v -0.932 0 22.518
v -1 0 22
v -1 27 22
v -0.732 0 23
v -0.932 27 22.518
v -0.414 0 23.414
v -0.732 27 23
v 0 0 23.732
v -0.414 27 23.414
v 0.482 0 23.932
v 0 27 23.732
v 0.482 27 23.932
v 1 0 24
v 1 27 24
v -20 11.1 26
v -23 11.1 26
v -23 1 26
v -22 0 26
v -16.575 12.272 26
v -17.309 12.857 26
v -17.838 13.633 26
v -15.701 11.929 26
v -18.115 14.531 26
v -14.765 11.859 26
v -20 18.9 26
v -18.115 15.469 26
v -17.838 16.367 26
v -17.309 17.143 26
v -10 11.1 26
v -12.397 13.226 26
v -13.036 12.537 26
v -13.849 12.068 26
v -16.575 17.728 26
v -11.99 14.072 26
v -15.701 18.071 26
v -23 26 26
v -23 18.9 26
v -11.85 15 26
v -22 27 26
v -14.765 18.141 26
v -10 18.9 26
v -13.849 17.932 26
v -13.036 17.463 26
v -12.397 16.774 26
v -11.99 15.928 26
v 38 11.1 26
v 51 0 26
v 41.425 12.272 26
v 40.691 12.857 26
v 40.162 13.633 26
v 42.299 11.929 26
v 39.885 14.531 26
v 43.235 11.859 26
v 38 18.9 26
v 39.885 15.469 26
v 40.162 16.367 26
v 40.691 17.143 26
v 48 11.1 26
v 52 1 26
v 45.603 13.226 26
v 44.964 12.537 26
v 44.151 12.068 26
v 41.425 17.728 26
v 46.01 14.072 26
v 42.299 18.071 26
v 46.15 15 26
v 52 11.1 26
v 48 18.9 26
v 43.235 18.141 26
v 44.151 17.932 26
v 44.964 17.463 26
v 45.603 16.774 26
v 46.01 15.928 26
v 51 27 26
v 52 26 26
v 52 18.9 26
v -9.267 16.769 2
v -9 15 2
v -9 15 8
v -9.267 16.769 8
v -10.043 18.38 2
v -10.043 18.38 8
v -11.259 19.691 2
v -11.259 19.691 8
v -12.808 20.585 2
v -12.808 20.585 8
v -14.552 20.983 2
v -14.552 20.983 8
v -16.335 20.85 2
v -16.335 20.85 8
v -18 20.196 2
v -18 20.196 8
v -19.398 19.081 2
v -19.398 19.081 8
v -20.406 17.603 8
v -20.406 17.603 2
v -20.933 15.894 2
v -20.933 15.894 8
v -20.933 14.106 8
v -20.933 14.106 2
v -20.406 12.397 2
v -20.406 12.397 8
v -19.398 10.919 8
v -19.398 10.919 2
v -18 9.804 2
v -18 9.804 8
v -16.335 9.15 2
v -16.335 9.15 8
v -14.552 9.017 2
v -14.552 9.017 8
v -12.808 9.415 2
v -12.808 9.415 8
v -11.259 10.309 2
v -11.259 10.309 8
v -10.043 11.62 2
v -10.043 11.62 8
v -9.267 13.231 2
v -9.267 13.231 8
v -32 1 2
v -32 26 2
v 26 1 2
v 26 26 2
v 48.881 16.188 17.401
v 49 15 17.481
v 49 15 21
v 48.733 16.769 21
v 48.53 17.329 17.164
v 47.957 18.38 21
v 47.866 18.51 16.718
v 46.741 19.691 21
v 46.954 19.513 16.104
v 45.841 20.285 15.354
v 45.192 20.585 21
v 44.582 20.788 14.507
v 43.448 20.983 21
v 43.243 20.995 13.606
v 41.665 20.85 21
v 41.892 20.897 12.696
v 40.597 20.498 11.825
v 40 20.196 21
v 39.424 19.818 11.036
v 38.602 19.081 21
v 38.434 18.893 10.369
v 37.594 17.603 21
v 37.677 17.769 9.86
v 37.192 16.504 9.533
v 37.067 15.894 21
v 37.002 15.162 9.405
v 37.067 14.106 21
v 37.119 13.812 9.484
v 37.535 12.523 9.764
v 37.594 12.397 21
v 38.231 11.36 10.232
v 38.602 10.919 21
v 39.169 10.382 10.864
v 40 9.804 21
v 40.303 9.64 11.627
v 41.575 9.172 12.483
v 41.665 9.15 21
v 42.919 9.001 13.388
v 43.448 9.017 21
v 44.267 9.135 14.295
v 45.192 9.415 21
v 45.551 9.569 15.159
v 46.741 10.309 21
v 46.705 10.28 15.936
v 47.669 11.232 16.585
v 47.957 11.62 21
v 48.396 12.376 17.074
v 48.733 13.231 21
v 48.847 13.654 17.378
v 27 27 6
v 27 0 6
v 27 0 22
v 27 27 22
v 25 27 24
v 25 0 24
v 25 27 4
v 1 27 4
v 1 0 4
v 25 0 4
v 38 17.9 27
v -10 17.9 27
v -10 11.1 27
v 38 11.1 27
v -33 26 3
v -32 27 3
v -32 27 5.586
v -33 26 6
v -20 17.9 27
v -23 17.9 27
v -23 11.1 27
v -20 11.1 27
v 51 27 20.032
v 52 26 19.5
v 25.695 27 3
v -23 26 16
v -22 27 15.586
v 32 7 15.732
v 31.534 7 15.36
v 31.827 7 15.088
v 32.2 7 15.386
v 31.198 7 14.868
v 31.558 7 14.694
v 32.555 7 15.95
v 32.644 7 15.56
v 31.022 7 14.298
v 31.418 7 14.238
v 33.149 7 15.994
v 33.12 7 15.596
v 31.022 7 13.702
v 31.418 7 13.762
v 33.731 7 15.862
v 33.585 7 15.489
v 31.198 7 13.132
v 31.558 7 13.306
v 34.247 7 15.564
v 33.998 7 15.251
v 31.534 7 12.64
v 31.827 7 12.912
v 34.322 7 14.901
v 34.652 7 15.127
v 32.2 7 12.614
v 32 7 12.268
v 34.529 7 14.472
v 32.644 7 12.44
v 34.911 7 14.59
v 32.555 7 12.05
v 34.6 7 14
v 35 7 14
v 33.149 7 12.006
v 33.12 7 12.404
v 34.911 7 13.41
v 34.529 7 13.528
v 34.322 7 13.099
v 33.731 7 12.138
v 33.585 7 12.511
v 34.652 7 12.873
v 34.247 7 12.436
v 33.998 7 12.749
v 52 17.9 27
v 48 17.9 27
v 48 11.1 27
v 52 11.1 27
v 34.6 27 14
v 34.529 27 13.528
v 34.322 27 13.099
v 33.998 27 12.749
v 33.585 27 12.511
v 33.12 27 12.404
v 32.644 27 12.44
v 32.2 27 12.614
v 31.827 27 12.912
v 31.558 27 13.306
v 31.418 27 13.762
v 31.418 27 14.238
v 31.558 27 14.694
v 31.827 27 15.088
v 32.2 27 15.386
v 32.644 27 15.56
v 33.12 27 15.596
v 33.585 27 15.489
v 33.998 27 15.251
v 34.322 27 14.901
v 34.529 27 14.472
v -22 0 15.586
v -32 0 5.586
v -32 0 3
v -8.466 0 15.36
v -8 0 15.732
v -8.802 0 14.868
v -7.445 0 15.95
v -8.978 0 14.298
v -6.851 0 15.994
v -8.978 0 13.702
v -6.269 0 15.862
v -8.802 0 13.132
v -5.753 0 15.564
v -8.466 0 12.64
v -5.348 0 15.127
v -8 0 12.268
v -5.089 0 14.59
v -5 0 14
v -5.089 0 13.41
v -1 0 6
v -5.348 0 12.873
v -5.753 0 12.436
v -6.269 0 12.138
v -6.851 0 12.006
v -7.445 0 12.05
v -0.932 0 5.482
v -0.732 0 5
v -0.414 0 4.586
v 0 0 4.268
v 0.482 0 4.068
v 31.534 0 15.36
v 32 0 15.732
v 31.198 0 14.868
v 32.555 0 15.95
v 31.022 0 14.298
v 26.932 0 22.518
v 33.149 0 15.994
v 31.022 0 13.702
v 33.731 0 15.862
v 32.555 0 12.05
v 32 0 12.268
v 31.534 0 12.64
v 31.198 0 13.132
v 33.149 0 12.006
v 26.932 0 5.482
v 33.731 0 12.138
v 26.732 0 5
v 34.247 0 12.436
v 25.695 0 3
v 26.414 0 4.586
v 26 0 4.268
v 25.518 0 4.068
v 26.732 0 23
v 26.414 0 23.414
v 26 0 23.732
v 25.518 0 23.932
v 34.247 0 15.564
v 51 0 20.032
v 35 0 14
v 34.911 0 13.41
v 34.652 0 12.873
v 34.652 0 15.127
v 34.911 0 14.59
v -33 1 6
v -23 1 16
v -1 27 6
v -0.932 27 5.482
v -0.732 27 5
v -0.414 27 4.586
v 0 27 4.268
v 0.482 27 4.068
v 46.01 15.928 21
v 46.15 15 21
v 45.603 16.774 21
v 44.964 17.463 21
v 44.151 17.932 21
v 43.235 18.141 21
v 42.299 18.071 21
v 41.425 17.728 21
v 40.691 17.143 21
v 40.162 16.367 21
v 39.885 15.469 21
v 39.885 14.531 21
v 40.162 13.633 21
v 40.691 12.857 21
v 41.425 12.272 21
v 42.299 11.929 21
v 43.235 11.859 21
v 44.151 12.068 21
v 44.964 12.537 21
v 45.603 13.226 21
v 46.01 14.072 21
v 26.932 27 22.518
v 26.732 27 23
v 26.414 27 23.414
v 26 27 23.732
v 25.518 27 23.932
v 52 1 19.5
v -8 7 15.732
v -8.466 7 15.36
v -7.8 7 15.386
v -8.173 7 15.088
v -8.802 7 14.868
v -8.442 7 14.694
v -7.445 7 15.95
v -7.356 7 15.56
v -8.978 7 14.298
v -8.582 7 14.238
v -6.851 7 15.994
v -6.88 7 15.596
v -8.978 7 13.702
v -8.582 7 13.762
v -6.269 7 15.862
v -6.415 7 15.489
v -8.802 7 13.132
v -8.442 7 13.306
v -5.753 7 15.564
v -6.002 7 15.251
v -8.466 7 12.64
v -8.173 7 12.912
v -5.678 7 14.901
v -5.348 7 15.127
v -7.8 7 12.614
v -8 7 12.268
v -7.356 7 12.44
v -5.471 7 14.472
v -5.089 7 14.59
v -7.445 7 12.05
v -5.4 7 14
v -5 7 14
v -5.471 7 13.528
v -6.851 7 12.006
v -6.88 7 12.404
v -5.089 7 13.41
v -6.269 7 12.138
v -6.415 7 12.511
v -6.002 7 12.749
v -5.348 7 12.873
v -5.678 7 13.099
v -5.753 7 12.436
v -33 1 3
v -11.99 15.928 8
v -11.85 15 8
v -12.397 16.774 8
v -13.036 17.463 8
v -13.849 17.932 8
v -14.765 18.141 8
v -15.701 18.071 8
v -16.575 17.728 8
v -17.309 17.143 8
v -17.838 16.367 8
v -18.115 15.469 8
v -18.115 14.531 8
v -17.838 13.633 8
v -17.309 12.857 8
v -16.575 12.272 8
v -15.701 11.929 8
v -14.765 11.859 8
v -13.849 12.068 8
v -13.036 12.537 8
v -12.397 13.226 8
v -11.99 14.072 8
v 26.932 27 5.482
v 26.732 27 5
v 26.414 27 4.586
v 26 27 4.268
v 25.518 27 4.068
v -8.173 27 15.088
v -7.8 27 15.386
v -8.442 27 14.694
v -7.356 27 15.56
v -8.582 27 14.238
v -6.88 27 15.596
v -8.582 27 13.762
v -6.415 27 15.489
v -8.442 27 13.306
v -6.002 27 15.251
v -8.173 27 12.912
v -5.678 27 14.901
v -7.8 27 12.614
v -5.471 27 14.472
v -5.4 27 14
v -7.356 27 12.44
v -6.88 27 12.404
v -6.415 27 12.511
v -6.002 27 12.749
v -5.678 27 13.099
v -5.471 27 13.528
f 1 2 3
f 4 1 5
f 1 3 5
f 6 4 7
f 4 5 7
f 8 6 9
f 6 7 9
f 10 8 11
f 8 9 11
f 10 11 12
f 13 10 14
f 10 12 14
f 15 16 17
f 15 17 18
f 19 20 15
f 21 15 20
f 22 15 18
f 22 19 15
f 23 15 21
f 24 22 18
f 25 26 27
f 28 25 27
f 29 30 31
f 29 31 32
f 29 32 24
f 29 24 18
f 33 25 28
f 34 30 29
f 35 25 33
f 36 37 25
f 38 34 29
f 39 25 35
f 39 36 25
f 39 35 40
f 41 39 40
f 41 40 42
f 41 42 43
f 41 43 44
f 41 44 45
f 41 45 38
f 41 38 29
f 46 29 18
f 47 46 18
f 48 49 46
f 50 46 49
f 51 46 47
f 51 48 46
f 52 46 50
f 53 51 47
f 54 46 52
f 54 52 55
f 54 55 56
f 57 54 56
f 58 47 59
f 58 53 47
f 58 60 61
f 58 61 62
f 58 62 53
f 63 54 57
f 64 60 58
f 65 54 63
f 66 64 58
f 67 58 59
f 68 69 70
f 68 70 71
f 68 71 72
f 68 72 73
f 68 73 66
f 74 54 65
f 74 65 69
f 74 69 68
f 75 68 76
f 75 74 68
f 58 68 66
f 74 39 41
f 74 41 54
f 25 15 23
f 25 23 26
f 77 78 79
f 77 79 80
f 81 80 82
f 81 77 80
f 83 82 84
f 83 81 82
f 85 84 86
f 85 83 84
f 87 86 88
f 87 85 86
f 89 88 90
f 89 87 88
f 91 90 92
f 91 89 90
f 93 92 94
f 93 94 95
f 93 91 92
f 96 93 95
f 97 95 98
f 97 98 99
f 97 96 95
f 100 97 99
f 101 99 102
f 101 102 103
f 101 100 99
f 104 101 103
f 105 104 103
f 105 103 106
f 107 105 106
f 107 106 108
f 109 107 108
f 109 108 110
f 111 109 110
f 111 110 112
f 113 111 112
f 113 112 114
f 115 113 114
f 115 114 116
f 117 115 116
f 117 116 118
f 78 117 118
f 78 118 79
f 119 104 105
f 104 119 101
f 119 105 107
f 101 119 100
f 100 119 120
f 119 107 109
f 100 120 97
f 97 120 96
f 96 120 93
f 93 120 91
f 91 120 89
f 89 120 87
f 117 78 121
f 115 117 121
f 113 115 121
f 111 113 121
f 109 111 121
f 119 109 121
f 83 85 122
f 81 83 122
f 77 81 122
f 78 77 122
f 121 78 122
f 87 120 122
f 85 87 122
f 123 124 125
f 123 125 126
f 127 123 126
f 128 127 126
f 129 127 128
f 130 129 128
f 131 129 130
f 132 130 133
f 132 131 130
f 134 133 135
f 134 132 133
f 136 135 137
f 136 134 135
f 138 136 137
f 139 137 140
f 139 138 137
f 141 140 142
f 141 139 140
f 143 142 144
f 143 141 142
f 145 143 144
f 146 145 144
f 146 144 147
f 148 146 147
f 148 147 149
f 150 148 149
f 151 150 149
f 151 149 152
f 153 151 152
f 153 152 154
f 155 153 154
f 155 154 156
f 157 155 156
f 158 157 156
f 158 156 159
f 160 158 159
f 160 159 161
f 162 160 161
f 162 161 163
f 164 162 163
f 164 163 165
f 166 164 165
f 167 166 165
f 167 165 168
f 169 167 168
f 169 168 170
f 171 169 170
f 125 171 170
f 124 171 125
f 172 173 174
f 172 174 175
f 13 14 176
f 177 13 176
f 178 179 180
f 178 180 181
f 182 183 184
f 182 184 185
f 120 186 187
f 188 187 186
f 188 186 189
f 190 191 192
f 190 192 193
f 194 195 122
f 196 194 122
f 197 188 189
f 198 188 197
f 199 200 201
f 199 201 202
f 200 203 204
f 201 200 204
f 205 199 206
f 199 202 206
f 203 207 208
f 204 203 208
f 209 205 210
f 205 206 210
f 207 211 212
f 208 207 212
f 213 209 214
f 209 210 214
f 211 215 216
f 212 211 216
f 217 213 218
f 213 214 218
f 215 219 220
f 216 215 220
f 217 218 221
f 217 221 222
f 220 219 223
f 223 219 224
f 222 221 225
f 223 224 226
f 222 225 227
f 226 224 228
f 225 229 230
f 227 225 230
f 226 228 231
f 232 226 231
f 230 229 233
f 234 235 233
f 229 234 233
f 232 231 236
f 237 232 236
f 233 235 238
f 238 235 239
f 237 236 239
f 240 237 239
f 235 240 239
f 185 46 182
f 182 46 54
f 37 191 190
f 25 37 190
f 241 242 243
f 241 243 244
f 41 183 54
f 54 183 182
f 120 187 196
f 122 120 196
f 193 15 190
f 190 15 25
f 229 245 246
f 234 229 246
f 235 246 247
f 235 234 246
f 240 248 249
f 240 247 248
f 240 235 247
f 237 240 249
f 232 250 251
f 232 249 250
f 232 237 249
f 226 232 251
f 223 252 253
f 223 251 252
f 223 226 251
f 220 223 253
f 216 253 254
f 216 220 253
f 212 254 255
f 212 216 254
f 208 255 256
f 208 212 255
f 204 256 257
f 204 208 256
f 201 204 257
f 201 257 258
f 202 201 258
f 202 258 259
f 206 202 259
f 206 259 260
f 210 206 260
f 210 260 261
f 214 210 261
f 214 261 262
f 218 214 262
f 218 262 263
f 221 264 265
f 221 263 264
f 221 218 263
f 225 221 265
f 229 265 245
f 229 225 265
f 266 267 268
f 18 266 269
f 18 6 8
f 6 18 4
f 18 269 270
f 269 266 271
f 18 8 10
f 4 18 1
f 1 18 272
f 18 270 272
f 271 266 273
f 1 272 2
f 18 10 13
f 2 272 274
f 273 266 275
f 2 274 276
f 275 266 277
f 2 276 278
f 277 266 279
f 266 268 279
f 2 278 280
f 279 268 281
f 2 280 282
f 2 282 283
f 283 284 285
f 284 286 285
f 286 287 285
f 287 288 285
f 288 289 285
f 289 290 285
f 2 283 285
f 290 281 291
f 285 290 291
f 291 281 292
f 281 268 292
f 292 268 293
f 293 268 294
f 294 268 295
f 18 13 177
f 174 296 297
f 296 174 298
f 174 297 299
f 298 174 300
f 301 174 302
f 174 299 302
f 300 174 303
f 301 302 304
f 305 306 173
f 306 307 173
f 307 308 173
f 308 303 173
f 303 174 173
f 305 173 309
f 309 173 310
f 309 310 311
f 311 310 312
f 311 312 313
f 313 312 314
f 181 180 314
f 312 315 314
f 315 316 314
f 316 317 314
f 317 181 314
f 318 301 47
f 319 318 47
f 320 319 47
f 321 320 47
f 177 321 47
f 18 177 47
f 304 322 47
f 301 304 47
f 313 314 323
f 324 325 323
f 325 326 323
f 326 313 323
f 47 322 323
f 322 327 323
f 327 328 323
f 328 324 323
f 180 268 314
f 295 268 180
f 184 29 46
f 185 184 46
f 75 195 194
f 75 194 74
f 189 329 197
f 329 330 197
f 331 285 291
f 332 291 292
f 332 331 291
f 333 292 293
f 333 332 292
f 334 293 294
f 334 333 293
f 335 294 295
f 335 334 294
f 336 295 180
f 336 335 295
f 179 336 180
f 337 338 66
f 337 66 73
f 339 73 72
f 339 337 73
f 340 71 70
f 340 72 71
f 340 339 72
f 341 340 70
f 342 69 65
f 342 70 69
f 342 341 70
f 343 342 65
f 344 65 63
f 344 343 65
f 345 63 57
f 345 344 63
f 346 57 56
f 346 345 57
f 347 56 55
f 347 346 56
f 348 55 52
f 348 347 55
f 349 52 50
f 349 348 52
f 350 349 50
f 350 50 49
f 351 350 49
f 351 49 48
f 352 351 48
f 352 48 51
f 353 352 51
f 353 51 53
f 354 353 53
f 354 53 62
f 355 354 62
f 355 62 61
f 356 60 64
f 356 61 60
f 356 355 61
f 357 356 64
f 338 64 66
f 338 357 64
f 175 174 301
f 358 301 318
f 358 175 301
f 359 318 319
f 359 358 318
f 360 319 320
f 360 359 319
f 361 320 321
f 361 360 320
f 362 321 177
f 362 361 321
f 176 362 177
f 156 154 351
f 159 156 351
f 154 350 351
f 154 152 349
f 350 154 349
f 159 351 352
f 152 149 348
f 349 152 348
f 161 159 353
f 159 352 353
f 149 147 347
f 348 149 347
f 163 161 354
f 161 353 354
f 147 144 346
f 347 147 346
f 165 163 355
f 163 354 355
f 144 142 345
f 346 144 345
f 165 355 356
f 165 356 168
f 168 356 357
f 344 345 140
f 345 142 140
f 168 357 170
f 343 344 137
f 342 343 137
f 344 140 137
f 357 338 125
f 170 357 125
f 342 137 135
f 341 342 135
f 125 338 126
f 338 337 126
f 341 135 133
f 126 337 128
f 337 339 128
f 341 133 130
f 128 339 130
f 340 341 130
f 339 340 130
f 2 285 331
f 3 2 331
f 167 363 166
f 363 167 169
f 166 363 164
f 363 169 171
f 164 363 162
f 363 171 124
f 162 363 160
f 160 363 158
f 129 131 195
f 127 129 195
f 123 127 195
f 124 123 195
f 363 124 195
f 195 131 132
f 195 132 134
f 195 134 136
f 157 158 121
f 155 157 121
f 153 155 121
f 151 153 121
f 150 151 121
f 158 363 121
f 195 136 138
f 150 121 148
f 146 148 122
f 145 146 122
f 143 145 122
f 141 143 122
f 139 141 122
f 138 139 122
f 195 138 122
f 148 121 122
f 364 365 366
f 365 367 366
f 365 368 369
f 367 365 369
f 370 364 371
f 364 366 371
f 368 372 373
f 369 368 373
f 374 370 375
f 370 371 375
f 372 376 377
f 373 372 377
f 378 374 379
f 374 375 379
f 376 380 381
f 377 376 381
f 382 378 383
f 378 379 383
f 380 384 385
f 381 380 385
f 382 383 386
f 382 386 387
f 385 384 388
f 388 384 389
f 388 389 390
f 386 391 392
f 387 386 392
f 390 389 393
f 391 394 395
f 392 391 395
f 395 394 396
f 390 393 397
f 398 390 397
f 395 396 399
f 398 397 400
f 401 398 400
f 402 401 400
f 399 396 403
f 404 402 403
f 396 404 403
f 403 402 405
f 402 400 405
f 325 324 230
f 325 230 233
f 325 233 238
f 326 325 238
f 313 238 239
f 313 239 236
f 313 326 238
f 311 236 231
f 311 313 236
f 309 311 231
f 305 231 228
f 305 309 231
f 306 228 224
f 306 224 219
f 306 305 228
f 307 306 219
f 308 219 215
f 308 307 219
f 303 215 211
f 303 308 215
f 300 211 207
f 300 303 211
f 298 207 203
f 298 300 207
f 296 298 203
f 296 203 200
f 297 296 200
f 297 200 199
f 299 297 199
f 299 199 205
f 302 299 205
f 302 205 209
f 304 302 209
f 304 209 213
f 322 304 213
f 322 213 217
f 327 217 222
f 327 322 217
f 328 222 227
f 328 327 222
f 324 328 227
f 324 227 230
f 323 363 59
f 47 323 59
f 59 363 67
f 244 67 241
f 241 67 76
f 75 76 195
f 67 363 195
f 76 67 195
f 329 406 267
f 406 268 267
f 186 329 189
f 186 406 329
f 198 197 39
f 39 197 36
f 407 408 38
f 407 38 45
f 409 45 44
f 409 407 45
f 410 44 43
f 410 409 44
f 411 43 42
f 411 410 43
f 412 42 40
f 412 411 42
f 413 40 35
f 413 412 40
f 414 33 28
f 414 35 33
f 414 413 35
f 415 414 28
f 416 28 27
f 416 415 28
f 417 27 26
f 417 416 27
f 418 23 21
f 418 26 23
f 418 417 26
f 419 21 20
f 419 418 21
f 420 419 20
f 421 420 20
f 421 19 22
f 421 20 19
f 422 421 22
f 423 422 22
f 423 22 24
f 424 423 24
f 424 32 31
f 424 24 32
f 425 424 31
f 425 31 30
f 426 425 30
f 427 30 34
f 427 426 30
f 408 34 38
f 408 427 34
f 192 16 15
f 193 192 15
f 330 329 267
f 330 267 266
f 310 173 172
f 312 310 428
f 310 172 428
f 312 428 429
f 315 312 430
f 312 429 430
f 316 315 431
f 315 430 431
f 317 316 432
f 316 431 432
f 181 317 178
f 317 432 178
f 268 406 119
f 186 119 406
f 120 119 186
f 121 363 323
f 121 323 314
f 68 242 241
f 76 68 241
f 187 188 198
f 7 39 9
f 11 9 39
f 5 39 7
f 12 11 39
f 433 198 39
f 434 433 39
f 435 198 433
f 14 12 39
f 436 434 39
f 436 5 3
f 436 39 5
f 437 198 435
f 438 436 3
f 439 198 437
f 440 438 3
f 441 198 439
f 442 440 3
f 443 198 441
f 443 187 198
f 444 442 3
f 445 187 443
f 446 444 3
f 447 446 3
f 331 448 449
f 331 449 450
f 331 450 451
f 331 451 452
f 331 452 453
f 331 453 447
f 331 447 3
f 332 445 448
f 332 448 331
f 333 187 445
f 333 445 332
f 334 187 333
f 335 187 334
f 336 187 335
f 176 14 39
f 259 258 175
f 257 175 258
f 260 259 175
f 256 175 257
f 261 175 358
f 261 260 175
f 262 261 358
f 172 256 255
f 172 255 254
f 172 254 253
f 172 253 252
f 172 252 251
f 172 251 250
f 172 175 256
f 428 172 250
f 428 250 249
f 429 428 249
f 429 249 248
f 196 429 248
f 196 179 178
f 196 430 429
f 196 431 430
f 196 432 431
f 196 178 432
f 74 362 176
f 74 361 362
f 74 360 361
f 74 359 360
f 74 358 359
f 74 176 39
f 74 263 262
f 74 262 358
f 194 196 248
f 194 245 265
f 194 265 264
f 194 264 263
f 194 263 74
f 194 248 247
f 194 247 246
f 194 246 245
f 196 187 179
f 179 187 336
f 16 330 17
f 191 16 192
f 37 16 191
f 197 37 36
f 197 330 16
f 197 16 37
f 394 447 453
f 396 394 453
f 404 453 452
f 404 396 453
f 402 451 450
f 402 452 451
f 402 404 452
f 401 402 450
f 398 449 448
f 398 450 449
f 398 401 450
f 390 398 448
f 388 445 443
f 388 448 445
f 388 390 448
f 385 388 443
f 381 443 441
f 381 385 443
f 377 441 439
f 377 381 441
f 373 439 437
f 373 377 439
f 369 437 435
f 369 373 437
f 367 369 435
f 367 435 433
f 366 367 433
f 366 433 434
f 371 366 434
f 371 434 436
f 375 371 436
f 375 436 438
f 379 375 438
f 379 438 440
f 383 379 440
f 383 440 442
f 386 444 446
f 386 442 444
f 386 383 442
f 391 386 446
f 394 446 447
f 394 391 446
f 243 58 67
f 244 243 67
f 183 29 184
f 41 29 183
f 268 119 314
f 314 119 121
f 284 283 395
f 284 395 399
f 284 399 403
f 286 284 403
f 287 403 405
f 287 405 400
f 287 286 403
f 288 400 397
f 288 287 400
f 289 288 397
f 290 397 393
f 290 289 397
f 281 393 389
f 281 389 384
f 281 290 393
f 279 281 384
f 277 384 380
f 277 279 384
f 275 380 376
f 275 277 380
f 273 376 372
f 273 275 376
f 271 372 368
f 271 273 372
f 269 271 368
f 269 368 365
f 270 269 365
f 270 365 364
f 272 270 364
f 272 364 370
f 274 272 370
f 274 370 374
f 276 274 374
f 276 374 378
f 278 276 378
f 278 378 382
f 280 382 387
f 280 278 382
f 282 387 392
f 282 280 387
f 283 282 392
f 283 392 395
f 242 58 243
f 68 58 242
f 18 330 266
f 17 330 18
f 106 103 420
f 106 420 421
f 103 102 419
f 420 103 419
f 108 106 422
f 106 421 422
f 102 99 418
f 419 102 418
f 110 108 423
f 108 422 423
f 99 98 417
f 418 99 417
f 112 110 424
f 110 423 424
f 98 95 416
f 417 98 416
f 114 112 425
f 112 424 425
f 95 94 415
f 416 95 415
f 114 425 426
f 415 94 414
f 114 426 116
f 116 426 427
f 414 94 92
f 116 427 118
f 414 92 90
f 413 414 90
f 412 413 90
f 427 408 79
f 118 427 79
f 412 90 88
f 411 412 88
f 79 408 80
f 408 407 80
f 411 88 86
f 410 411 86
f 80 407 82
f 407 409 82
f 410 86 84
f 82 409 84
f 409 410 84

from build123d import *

# Parameters (mm, degrees)
BOX007_W          = 10
BOX007_H          = 10
BOX007_DEPTH      = 10
BOX008_W          = 10
BOX008_H          = 10
BOX008_DEPTH      = 10
CYLINDER003_R     = 1.6
CYLINDER003_DEPTH = 30
CYLINDER002_R     = 1.6
CYLINDER002_DEPTH = 30
CYLINDER001_R     = 2
CYLINDER001_DEPTH = 7
CYLINDER_R        = 2
CYLINDER_DEPTH    = 7
BOX_W             = 28
BOX_H             = 30
BOX_DEPTH         = 20
FILLET_R          = 2
CYLINDER005_R     = 3.15
CYLINDER005_DEPTH = 30
CYLINDER004_R     = 6
CYLINDER004_DEPTH = 8
CYLINDER007_R     = 6
CYLINDER007_DEPTH = 21
CYLINDER006_R     = 3.15
CYLINDER006_DEPTH = 30
BOX003_W          = 75
BOX003_H          = 27
BOX003_DEPTH      = 24
CHAMFER002_SIZE2  = 26
CHAMFER002_SIZE   = 17.5
BOX004_W          = 11
BOX004_H          = 27
BOX004_DEPTH      = 14
CHAMFER_SIZE      = 10
BOX005_W          = 75
BOX005_H          = 7.8
BOX005_DEPTH      = 2
CHAMFER003_SIZE   = 1
CHAMFER004_SIZE   = 1


with BuildPart() as cube007:
    # Box007 → Box007 (new body)
    with BuildSketch(Plane(origin=(-20, 10, 26), x_dir=(1, 0, 0), z_dir=(0, 0, 1))):
        with Locations((5, 5)):
            Rectangle(BOX007_W, BOX007_H)
    extrude(amount=BOX007_DEPTH)


with BuildPart() as fusion002011:
    # Box008 → Box008 (new body)
    with BuildSketch(Plane(origin=(38, 10, 26), x_dir=(1, 0, 0), z_dir=(0, 0, 1))):
        with Locations((5, 5)):
            Rectangle(BOX008_W, BOX008_H)
    extrude(amount=BOX008_DEPTH)

    # Fusion002011: union Cube007
    add(cube007.part)


with BuildPart() as cylinder003:
    # Cylinder003 → Cylinder003 (new body)
    with BuildSketch(Plane(origin=(-20, 0, 17), x_dir=(1, 0, 0), z_dir=(0, 1, 0))):
        Circle(CYLINDER003_R)
    extrude(amount=CYLINDER003_DEPTH)


with BuildPart() as cylinder002:
    # Cylinder002 → Cylinder002 (new body)
    with BuildSketch(Plane(origin=(20, 0, 17), x_dir=(1, 0, 0), z_dir=(0, 1, 0))):
        Circle(CYLINDER002_R)
    extrude(amount=CYLINDER002_DEPTH)


with BuildPart() as cylinder001:
    # Cylinder001 → Cylinder001 (new body)
    with BuildSketch(Plane(origin=(20, 0, 17), x_dir=(1, 0, 0), z_dir=(0, 1, 0))):
        Circle(CYLINDER001_R)
    extrude(amount=CYLINDER001_DEPTH)


with BuildPart() as cylinder:
    # Cylinder → Cylinder (new body)
    with BuildSketch(Plane(origin=(-20, 0, 17), x_dir=(1, 0, 0), z_dir=(0, 1, 0))):
        Circle(CYLINDER_R)
    extrude(amount=CYLINDER_DEPTH)


with BuildPart() as plug_slot:
    # Box → Box (new body)
    with BuildSketch(Plane(origin=(-14, 0, 7), x_dir=(1, 0, 0), z_dir=(0, 0, 1))):
        with Locations((14, 15)):
            Rectangle(BOX_W, BOX_H)
    extrude(amount=BOX_DEPTH)

    # Fillet
    fillet_edges = [plug_slot.edges().sort_by_distance(p)[0] for p in [
        (-14, 15, 27),
        (-14, 15, 7),
        (14, 15, 27),
        (14, 15, 7),
    ]]
    fillet(fillet_edges, radius=FILLET_R)

    # Fusion: union Cylinder003, Cylinder002, Cylinder001, Cylinder
    add(cylinder003.part)
    add(cylinder002.part)
    add(cylinder001.part)
    add(cylinder.part)


with BuildPart() as plug_slot_1:
    # Fusion placement: moved
    add(plug_slot.part.moved(Location((13, 0, -3))))


with BuildPart() as cylinder005:
    # Cylinder005 → Cylinder005 (new body)
    with BuildSketch(Plane(origin=(0, 15, 0), x_dir=(1, 0, 0), z_dir=(0, 0, 1))):
        Circle(CYLINDER005_R)
    extrude(amount=CYLINDER005_DEPTH)


with BuildPart() as fusion002009:
    # Cylinder004 → Cylinder004 (new body)
    with BuildSketch(Plane(origin=(0, 15, 0), x_dir=(1, 0, 0), z_dir=(0, 0, 1))):
        Circle(CYLINDER004_R)
    extrude(amount=CYLINDER004_DEPTH)

    # Fusion002009: union Cylinder005
    add(cylinder005.part)


with BuildPart() as fusion002009_1:
    # Fusion002009 placement: moved
    add(fusion002009.part.moved(Location((-15, 0, 0))))


with BuildPart() as cylinder007:
    # Cylinder007 → Cylinder007 (new body)
    with BuildSketch(Plane(origin=(43, 15, 0), x_dir=(1, 0, 0), z_dir=(0, 0, 1))):
        Circle(CYLINDER007_R)
    extrude(amount=CYLINDER007_DEPTH)


with BuildPart() as fusion002010:
    # Cylinder006 → Cylinder006 (new body)
    with BuildSketch(Plane(origin=(43, 15, 0), x_dir=(1, 0, 0), z_dir=(0, 0, 1))):
        Circle(CYLINDER006_R)
    extrude(amount=CYLINDER006_DEPTH)

    # Fusion002005: union Cylinder007
    add(cylinder007.part)

    # Fusion002010: union Fusion002009
    add(fusion002009_1.part)


with BuildPart() as chamfer002:
    # Box003 → Box003 (new body)
    with BuildSketch(Plane(origin=(-23, 0, 2), x_dir=(1, 0, 0), z_dir=(0, 0, 1))):
        with Locations((37.5, 13.5)):
            Rectangle(BOX003_W, BOX003_H)
    extrude(amount=BOX003_DEPTH)

    # Chamfer002
    chamfer002_edges = [chamfer002.edges().sort_by_distance(p)[0] for p in [
        (52, 13.5, 2),
    ]]
    chamfer002_side = chamfer002.faces().sort_by_distance((52, 13.5, 14))[0]
    chamfer(chamfer002_edges, length=CHAMFER002_SIZE, length2=CHAMFER002_SIZE2, reference=chamfer002_side)


with BuildPart() as chamfer_body:
    # Box004 → Box004 (new body)
    with BuildSketch(Plane(origin=(-33, 0, 2), x_dir=(1, 0, 0), z_dir=(0, 0, 1))):
        with Locations((5.5, 13.5)):
            Rectangle(BOX004_W, BOX004_H)
    extrude(amount=BOX004_DEPTH)

    # Chamfer
    chamfer_edges = [chamfer_body.edges().sort_by_distance(p)[0] for p in [
        (-33, 13.5, 16),
    ]]
    chamfer(chamfer_edges, length=CHAMFER_SIZE)


with BuildPart() as cut008004003004014002002008002001:
    # Box005 → Box005 (new body)
    with BuildSketch(Plane(origin=(-23, 11.1, 25), x_dir=(1, 0, 0), z_dir=(0, 0, 1))):
        with Locations((37.5, 3.9)):
            Rectangle(BOX005_W, BOX005_H)
    extrude(amount=BOX005_DEPTH)

    # Chamfer003
    chamfer003_edges = [cut008004003004014002002008002001.edges().sort_by_distance(p)[0] for p in [
        (14.5, 18.9, 27),
    ]]
    chamfer(chamfer003_edges, length=CHAMFER003_SIZE)

    # Fusion002008: union Chamfer002, Chamfer body
    add(chamfer002.part)
    add(chamfer_body.part)

    # Cut: cut Fusion002010
    add(fusion002010.part, mode=Mode.SUBTRACT)

    # Cut008004003004014002002008: cut plug-slot
    add(plug_slot_1.part, mode=Mode.SUBTRACT)

    # Chamfer004
    chamfer004_edges = [cut008004003004014002002008002001.edges().sort_by_distance(p)[0] for p in [
        (39, 0, 10.75),
        (39, 27, 10.75),
        (-23, 27, 21),
        (-23, 0, 21),
        (-28, 0, 11),
        (-28, 27, 11),
        (-33, 0, 4),
        (-33, 13.5, 2),
        (-33, 27, 4),
        (52, 0, 22.75),
        (52, 27, 22.75),
        (-3.5, 27, 2),
        (-3.5, 0, 2),
    ]]
    chamfer(chamfer004_edges, length=CHAMFER004_SIZE)

    # Cut008004003004014002002008002: cut Fusion002011
    add(fusion002011.part, mode=Mode.SUBTRACT)


solid = cut008004003004014002002008002001.part
